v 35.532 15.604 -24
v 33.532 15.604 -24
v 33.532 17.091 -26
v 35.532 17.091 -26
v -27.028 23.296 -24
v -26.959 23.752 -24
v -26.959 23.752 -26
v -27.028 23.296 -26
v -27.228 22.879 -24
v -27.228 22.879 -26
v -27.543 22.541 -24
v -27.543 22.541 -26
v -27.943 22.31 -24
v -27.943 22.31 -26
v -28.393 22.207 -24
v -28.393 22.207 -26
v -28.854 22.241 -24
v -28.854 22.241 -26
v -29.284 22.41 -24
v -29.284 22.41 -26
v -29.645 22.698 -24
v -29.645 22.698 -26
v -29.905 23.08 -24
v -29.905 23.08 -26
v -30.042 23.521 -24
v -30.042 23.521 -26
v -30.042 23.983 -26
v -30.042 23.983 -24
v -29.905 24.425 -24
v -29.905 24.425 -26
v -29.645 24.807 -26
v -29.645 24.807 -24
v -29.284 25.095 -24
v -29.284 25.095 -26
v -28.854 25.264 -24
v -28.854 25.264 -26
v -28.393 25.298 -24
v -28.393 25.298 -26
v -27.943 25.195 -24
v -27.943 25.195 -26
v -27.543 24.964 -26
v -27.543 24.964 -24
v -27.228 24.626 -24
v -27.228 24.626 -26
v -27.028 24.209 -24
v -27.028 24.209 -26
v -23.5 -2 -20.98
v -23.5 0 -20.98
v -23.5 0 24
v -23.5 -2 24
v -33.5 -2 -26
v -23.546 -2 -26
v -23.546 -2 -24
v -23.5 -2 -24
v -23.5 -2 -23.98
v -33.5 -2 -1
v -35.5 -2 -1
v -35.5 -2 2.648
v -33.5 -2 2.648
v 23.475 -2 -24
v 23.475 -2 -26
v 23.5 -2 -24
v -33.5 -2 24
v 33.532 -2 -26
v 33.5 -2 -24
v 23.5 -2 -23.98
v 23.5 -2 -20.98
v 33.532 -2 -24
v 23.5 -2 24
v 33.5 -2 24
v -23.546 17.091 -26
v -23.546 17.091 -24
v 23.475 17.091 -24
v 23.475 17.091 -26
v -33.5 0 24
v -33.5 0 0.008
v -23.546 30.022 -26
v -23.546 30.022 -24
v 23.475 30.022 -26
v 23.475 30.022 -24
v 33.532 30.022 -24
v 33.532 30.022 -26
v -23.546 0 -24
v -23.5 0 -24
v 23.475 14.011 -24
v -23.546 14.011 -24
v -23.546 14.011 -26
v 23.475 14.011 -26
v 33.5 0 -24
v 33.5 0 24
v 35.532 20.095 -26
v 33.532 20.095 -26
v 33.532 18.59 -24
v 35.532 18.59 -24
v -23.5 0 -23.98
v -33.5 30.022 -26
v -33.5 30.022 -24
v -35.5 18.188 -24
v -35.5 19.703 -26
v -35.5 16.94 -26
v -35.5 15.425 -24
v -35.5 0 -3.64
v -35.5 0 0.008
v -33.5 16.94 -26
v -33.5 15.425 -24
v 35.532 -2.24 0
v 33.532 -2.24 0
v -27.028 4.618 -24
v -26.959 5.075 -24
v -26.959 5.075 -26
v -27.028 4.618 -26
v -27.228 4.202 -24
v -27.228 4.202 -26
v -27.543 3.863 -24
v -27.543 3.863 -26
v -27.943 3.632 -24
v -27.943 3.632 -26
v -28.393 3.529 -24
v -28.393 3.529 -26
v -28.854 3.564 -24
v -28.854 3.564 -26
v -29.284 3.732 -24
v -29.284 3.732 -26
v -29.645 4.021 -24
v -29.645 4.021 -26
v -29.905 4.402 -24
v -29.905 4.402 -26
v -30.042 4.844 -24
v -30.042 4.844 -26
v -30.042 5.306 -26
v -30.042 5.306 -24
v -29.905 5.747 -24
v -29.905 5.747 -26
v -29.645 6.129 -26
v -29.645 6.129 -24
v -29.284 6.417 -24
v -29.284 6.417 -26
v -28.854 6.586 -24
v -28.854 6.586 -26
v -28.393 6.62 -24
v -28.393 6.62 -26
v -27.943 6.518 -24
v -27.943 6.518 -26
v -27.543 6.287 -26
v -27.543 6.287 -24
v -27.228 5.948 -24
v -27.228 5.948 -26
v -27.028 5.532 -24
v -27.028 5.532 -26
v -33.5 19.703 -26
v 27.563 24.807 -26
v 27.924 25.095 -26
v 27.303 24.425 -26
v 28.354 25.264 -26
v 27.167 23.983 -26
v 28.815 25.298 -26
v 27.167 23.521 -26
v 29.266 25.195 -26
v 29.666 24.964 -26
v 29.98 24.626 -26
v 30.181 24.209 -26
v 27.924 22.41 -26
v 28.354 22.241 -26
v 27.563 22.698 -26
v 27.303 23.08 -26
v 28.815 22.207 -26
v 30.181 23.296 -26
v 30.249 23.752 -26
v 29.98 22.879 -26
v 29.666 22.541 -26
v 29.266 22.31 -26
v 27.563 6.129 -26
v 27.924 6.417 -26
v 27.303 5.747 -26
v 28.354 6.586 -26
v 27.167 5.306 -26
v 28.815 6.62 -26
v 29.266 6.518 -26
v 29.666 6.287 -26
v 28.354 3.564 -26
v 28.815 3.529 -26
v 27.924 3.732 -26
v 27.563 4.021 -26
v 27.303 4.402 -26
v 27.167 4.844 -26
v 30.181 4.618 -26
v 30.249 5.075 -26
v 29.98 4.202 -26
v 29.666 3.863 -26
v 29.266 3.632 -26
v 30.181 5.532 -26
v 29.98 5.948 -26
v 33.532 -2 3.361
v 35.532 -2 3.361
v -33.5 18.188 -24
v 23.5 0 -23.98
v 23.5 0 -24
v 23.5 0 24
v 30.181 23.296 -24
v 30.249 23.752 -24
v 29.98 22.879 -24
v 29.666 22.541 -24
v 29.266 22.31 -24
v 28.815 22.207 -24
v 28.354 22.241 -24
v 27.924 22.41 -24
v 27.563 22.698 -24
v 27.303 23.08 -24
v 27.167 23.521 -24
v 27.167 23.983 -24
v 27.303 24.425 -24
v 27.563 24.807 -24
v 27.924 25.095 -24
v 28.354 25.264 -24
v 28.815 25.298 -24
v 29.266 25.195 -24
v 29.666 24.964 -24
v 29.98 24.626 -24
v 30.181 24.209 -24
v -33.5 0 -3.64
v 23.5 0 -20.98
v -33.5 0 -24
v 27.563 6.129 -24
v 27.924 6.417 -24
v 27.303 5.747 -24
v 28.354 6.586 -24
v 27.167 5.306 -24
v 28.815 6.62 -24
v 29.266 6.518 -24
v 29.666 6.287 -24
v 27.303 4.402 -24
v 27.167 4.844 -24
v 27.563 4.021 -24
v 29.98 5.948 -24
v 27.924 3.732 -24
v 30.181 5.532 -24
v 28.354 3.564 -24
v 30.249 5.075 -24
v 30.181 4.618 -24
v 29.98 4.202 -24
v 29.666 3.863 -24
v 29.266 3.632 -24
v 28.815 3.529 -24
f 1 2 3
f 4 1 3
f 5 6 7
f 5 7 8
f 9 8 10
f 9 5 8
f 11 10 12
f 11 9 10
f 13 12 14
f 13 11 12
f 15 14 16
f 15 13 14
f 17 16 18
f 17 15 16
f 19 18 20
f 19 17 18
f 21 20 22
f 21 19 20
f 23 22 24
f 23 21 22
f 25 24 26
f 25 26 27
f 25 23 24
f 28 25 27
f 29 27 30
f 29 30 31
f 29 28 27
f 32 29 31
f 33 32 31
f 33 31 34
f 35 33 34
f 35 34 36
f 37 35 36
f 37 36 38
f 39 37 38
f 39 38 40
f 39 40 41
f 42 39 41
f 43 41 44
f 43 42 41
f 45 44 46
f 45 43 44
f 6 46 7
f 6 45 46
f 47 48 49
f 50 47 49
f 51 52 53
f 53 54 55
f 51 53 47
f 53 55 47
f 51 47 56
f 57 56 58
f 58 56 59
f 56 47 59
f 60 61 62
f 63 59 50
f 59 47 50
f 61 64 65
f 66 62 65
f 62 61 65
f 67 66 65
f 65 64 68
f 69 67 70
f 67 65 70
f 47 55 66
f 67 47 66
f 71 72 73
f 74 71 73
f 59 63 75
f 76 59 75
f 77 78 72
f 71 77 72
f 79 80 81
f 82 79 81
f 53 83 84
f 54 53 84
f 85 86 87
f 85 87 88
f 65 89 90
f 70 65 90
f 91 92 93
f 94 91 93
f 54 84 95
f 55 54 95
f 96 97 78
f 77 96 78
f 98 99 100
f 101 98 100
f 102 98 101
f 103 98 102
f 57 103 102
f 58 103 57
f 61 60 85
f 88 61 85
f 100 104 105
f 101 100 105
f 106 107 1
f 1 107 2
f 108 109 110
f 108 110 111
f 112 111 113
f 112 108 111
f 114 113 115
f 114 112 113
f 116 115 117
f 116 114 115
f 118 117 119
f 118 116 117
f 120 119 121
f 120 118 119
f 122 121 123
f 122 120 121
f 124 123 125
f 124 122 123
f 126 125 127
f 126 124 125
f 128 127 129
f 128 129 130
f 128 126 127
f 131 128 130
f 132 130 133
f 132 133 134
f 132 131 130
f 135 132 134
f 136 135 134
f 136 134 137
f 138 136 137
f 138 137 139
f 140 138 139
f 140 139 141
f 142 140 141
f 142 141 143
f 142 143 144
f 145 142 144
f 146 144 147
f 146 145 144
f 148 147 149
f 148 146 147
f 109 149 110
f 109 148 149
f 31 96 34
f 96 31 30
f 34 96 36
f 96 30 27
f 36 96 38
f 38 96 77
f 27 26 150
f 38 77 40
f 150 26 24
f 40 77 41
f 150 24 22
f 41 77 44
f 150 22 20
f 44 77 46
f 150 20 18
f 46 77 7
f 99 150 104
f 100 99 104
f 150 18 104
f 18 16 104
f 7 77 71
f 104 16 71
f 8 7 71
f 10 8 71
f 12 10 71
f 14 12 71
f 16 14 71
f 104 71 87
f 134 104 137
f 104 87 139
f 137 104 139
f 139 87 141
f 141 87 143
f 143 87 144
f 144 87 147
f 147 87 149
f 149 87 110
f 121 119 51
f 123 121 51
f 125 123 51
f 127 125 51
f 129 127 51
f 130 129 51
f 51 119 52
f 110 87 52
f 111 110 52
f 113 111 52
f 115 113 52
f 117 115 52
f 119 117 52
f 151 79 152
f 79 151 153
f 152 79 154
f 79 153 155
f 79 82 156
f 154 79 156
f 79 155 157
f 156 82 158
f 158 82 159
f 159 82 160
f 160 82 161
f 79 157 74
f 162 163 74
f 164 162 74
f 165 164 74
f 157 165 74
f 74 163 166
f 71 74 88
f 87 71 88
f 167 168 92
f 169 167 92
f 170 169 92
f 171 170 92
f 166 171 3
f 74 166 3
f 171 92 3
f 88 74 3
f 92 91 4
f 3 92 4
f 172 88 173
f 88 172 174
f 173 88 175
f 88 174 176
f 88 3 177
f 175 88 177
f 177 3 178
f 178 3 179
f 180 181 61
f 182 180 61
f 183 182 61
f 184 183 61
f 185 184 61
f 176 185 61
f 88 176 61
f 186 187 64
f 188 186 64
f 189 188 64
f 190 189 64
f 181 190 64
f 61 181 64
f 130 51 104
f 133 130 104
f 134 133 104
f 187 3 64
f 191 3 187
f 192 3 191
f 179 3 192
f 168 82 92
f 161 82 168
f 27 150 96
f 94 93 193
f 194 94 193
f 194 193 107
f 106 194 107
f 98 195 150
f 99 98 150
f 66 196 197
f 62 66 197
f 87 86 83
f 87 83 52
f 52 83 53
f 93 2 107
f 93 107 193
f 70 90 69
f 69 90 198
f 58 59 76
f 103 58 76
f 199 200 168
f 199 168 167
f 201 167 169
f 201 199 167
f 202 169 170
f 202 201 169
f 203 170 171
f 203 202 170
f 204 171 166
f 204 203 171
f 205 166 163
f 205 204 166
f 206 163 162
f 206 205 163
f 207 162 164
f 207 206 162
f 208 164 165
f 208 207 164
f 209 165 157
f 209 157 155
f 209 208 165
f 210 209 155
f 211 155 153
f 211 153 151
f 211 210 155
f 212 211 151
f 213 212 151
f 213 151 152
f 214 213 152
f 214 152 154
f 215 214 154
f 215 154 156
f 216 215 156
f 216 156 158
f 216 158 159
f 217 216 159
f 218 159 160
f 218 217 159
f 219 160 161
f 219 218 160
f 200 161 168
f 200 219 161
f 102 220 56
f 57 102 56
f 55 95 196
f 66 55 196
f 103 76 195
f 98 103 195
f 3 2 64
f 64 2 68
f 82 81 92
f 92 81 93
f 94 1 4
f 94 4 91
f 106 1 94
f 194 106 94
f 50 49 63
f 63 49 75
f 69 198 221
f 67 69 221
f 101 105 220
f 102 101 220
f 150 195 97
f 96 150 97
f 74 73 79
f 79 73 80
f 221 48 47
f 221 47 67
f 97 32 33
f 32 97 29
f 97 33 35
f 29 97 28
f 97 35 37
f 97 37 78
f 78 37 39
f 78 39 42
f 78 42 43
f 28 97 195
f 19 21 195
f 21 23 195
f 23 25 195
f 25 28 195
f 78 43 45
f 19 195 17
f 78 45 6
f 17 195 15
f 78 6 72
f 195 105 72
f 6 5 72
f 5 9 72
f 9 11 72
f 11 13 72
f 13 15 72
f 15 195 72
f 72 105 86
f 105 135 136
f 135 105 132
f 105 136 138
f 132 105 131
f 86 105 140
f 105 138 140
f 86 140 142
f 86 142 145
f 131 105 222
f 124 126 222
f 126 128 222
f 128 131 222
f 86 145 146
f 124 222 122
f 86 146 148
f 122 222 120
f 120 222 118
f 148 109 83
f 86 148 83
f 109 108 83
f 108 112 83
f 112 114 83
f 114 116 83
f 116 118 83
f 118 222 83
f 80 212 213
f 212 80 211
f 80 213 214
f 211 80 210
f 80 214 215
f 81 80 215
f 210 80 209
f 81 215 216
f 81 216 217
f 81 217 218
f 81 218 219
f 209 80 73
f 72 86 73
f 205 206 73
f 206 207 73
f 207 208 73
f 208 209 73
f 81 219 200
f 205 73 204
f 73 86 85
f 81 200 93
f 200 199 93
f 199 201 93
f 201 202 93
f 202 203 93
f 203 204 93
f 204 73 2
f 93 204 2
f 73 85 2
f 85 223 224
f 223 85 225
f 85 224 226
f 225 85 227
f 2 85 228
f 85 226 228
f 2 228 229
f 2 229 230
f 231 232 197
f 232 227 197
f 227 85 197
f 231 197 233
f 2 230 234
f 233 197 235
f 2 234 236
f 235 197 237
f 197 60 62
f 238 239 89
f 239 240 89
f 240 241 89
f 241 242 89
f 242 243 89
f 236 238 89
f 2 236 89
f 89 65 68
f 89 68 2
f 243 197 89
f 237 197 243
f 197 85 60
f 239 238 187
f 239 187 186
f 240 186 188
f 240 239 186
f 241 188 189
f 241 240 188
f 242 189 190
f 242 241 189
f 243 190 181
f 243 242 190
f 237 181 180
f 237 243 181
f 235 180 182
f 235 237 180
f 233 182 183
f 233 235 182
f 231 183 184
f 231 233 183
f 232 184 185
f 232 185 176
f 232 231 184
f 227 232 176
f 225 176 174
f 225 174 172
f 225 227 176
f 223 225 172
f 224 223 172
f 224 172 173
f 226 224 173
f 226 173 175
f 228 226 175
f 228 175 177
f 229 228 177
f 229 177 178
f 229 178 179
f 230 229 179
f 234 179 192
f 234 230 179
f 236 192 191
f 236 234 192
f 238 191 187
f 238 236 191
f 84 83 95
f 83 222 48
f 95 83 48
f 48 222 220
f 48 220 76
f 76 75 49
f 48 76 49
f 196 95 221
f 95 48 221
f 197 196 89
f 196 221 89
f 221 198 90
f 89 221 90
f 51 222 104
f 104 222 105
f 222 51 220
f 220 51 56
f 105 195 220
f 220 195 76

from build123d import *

# Parameters (mm, degrees)
F1_DEPTH = 2
F2_W     = 48.4285755818
F2_H     = 3
F3_DEPTH = 2
F4_R     = 1.55
F4_W     = 9.9543361962
F4_H     = 2
F4_W_2   = 47.0205396414
F4_H_2   = 3.0802486688
F5_DEPTH = 2
F7_DEPTH = 2
F9_DEPTH = 2


# Not quite as in the source:
# - a feature names something its author has since deleted; it is built from what else it names


with BuildPart() as f1:
    # F0 (on Front) → F1 (new body)
    with BuildSketch(Plane.XZ):
        Polygon((-23.5, 24), (-33.5, 24), (-33.5, -24), (-23.5, -24), (-23.5, -21), (-23.5, 20.9024734795), align=None)
    extrude(amount=F1_DEPTH)



with BuildPart() as f1b:
    # F0 (on Front) → F1, piece 2 (new body)
    with BuildSketch(Plane.XZ):
        Polygon((33.5, 24), (23.5, 24), (23.5, 20.9024734795), (23.5, -21), (23.5, -24), (33.5, -24), align=None)
    extrude(amount=F1_DEPTH)


with BuildPart() as f1_1:
    add(f1.part)

    add(f1b.part)  # F3 merges F1b
    # F2 (on Front) → F3 (join)
    with BuildSketch(Plane.XZ):
        with Locations((-0.0266507268, -22.4803313563)):
            Rectangle(F2_W, F2_H)
    extrude(amount=F3_DEPTH)

    # F4 (on face) → F5 (join)
    with BuildSketch(Plane(origin=(0, 0, -24), x_dir=(1, 0, 0), z_dir=(0, 0, -1))):
        Polygon((-23.5456638038, 0), (-33.5, 0), (-33.5, -30.0217941403), (-23.5456638038, -30.0217941403), (-23.5456638038, -17.091145739), (-23.5456638038, -14.0108970702), align=None)
        with Locations((-28.5089425743, -23.7523894757)):
            Circle(F4_R, mode=Mode.SUBTRACT)
        with Locations((-28.5089425743, -5.0747846253)):
            Circle(F4_R, mode=Mode.SUBTRACT)
        with Locations((-28.5228319019, 1)):
            Rectangle(F4_W, F4_H)
        Polygon((33.5320457816, 2), (23.4748758376, 2), (23.4748758376, -2.9849826824), (23.4748758376, -14.0108970702), (23.4748758376, -17.091145739), (23.4748758376, -30.0217941403), (33.5320457816, -30.0217941403), align=None)
        with Locations((28.699381277, -23.7523894757)):
            Circle(F4_R, mode=Mode.SUBTRACT)
        with Locations((28.699381277, -5.0747846253)):
            Circle(F4_R, mode=Mode.SUBTRACT)
        with Locations((-0.0353939831, -15.5510214046)):
            Rectangle(F4_W_2, F4_H_2)
    extrude(amount=F5_DEPTH)

    # F6 (on face) → F7 (join)
    with BuildSketch(Plane.YZ.offset(33.5320457816)):
        Polygon((-2, 3.3605340868), (-2.2395208944, 0), (15.6041713825, -24), (18.5901388697, -24), align=None)
        Polygon((18.5901388697, -24), (15.6041713825, -24), (17.091145739, -26), (20.0952365994, -26), align=None)
    extrude(amount=F7_DEPTH)

    # F8 (on face) → F9 (join)
    with BuildSketch(Plane(origin=(-33.5, 0, 0), x_dir=(0, -1, 0), z_dir=(-1, 0, 0))):
        Polygon((2, 2.6476460043), (0, 0.0077232947), (0, -3.6399227096), (2, -1), align=None)
        Polygon((0, 0.0077232947), (-18.1882016523, -24), (-15.4247525627, -24), (0, -3.6399227096), align=None)
        Polygon((-18.1882016523, -24), (-19.7033975273, -26), (-16.9399484377, -26), (-15.4247525627, -24), align=None)
    extrude(amount=F9_DEPTH)


solid = f1_1.part
